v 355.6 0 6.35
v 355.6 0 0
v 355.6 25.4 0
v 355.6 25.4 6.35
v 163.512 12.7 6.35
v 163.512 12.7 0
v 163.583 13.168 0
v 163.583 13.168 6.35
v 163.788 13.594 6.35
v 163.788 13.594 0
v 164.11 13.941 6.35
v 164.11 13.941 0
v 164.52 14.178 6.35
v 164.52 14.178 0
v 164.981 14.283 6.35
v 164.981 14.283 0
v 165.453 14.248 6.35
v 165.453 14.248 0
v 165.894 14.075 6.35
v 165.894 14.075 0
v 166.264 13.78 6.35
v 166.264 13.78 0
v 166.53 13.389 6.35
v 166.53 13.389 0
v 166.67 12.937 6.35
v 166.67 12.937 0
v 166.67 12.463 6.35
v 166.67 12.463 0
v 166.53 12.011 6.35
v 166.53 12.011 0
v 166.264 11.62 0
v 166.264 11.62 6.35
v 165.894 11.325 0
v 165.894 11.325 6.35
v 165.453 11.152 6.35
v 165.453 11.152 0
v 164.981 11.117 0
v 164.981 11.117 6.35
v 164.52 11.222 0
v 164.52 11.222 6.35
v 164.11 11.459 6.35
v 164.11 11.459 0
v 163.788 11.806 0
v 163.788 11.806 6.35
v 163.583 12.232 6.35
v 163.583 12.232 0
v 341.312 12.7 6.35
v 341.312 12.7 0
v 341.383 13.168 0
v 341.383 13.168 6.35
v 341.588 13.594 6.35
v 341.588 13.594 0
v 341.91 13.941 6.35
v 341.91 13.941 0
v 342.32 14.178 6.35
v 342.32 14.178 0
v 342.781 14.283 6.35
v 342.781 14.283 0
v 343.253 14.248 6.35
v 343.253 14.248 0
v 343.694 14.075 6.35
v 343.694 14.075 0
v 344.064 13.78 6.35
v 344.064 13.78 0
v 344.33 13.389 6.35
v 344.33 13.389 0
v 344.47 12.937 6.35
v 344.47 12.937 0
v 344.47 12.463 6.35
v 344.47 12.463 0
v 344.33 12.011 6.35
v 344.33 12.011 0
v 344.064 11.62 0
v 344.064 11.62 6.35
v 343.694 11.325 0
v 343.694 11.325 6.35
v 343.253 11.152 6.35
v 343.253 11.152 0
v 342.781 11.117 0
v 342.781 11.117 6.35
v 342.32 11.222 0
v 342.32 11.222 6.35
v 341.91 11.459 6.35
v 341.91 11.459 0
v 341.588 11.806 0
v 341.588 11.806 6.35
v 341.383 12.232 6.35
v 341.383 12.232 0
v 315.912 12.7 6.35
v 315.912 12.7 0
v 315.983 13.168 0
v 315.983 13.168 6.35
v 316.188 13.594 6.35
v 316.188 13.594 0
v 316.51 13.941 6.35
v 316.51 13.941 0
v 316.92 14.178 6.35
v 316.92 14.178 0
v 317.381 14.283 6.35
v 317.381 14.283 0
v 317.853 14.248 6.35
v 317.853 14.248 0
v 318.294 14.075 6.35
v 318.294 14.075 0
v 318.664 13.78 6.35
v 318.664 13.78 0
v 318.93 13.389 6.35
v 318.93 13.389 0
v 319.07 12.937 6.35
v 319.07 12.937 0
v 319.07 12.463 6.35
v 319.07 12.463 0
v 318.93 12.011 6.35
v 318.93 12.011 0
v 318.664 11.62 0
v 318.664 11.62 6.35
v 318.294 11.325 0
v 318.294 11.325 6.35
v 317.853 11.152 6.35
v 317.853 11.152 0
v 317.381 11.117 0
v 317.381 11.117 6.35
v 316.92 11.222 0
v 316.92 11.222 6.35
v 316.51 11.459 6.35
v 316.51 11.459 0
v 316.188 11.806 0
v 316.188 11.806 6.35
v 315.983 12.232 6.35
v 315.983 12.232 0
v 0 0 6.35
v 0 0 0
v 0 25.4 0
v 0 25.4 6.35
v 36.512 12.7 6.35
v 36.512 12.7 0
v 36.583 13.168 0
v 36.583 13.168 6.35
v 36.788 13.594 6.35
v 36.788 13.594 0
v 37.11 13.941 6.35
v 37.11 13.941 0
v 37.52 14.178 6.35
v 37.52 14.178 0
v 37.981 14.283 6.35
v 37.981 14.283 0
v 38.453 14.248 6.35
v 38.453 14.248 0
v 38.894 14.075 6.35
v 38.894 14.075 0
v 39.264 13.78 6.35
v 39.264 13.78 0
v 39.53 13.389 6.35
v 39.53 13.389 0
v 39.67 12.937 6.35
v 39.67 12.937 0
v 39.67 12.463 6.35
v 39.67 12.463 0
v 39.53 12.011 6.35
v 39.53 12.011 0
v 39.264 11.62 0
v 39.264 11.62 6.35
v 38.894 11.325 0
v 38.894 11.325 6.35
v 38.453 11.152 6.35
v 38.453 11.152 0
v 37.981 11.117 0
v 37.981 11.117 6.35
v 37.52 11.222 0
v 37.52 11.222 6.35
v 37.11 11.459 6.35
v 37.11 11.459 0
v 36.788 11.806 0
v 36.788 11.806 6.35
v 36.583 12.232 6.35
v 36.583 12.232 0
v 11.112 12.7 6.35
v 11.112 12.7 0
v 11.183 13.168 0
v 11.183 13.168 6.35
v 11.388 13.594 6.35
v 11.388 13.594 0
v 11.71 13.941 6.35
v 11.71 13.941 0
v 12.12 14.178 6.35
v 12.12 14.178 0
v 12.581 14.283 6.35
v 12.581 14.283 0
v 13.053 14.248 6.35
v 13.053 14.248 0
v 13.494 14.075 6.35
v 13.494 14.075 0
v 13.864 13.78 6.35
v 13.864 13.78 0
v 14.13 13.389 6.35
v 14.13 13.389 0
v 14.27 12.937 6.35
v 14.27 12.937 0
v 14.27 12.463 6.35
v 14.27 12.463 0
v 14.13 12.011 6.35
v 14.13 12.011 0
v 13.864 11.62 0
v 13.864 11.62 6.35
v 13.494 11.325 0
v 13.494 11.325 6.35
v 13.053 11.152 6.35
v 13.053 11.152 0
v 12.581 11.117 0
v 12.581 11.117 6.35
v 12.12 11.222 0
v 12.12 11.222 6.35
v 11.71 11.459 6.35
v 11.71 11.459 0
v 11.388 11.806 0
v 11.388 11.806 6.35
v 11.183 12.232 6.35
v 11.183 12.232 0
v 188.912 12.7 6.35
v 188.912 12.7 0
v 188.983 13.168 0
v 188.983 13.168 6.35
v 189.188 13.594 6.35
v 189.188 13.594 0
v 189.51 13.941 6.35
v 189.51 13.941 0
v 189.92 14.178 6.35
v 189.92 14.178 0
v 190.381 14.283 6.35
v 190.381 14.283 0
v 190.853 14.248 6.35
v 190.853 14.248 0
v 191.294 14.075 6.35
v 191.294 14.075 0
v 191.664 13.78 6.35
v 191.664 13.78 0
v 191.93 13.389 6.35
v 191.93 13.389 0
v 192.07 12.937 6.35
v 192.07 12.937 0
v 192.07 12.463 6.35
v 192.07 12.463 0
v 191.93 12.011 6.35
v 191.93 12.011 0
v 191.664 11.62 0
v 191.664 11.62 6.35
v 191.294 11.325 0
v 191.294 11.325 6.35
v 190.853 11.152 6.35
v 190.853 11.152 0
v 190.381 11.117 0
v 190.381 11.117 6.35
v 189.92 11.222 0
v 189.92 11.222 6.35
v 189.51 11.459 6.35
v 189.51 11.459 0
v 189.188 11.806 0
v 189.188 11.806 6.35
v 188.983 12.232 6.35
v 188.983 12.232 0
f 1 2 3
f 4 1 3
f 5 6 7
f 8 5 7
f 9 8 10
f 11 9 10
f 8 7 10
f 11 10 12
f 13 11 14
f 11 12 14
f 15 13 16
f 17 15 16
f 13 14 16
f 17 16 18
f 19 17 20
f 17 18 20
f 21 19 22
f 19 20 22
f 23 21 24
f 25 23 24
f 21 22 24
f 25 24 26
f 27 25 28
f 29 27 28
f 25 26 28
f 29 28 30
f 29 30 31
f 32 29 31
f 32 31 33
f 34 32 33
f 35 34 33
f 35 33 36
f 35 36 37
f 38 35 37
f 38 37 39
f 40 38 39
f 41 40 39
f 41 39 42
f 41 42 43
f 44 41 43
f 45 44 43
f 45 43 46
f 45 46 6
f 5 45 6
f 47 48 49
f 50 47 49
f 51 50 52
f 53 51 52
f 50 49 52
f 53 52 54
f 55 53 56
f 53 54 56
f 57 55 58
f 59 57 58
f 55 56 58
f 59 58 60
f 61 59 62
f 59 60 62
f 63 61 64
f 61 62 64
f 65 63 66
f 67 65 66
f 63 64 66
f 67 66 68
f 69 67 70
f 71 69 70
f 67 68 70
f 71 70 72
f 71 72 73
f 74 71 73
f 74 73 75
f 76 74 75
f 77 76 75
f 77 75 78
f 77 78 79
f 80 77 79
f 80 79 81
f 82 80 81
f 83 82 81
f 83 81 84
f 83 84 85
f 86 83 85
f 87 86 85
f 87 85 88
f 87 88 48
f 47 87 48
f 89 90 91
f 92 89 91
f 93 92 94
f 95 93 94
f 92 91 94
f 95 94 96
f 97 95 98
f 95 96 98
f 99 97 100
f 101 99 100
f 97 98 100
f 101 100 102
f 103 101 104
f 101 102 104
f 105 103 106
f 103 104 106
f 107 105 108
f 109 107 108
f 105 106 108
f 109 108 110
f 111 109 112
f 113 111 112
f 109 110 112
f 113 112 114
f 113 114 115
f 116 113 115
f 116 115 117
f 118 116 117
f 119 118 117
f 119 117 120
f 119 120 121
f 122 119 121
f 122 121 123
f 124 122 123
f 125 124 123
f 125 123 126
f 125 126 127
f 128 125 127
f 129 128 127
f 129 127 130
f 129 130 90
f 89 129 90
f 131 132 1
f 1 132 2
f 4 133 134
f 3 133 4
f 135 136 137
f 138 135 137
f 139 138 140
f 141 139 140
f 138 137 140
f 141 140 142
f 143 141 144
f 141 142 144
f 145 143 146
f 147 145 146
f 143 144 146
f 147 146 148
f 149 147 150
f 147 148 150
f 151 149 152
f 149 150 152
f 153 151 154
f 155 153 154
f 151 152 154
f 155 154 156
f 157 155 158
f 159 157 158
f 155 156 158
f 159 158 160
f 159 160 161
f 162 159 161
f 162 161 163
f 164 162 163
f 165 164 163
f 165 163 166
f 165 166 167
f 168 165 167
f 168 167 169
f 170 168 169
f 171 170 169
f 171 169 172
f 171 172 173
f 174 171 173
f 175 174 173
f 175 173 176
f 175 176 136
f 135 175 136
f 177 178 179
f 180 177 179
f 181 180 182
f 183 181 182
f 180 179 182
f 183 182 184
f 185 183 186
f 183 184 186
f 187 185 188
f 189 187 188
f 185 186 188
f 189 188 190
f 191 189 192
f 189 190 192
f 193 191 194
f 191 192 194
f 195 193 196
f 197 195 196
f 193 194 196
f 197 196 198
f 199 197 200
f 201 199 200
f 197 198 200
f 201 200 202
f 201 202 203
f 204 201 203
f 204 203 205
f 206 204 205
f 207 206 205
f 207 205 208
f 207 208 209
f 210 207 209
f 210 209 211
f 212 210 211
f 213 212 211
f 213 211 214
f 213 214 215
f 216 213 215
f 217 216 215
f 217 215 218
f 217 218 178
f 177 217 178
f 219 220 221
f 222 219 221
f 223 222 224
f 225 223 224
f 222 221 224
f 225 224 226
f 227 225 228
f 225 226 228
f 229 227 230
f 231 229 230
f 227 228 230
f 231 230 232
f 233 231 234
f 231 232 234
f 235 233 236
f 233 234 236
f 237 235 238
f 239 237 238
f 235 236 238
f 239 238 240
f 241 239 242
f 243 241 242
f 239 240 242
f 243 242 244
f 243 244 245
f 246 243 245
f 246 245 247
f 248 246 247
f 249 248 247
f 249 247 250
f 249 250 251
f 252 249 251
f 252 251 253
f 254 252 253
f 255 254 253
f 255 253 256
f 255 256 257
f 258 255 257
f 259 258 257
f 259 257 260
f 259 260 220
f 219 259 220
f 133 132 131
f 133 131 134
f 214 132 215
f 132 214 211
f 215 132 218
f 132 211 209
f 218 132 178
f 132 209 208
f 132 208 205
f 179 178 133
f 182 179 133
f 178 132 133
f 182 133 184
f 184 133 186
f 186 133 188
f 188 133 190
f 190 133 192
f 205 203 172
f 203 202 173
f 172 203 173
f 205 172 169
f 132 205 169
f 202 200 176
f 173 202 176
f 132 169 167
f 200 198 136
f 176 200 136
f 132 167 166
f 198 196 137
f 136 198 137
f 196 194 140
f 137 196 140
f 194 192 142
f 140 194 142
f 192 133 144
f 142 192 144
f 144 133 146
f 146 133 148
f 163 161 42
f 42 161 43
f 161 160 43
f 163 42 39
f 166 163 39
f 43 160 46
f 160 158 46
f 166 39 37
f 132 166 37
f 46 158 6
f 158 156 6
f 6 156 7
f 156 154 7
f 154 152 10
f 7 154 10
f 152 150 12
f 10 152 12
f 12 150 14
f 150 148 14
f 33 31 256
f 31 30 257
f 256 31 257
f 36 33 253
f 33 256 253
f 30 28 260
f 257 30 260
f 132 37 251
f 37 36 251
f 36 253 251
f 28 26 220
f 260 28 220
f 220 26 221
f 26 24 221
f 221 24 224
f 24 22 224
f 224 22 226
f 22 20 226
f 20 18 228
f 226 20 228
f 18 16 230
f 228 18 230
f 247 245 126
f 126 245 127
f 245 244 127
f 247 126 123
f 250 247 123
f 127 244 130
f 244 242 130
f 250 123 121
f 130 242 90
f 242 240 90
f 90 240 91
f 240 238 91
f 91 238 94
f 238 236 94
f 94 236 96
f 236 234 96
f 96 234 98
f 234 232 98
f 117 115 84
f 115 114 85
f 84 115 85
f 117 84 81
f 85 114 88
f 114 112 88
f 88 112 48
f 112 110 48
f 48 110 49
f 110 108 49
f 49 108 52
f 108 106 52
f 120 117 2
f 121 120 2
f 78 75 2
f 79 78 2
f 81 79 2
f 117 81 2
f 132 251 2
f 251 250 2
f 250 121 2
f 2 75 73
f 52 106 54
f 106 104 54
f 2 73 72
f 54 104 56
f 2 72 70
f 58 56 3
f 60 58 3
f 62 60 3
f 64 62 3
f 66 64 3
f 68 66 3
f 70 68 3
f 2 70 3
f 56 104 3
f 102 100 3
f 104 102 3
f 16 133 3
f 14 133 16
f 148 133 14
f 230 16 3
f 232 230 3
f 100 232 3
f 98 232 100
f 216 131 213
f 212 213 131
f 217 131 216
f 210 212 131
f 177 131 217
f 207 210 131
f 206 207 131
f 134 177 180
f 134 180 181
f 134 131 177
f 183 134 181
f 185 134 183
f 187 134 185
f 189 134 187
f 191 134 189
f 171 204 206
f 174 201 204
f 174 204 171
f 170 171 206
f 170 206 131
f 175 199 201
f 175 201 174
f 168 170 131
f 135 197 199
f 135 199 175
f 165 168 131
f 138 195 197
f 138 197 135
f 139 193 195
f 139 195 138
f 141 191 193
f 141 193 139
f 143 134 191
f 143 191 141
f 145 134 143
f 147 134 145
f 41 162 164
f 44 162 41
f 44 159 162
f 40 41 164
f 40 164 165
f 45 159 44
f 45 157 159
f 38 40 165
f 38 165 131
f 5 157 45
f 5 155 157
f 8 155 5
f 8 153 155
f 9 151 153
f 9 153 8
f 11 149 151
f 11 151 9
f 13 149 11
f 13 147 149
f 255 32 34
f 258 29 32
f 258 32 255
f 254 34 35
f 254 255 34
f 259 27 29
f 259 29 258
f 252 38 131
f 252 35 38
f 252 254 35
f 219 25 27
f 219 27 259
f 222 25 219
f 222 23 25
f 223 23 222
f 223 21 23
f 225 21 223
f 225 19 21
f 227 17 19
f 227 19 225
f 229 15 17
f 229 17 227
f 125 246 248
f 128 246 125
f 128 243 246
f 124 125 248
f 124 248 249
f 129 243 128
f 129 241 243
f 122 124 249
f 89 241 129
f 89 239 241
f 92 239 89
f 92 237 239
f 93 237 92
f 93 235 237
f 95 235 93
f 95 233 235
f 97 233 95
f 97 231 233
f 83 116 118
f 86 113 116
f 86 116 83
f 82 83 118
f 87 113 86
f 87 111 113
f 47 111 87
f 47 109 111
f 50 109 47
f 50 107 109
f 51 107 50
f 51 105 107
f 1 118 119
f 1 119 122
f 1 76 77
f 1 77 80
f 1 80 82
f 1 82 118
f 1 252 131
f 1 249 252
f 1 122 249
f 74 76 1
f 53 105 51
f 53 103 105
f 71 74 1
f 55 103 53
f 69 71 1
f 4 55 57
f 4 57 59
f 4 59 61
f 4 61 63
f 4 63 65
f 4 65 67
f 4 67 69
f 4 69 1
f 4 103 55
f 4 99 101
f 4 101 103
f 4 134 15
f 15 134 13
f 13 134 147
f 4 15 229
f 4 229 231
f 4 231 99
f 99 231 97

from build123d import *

# Parameters (mm, degrees)
F0_W     = 355.6
F0_H     = 25.4
F1_DEPTH = 6.35
F3_D     = 3.175
F5_D     = 3.175


with BuildPart() as f1:
    # F0 (on Top) → F1 (new body)
    with BuildSketch(Plane.XY):
        with Locations((177.8, 12.7)):
            Rectangle(F0_W, F0_H)
    extrude(amount=F1_DEPTH)

    # F3 (through all)
    with Locations(Plane.XY.offset(6.35)):
        with Locations((165.1, 12.7), (190.5, 12.7)):
            Hole(F3_D / 2)

    # F5 (through all)
    with Locations(Plane.XY.offset(6.35)):
        with Locations((12.7, 12.7), (342.9, 12.7), (38.1, 12.7), (317.5, 12.7)):
            Hole(F5_D / 2)


solid = f1.part
